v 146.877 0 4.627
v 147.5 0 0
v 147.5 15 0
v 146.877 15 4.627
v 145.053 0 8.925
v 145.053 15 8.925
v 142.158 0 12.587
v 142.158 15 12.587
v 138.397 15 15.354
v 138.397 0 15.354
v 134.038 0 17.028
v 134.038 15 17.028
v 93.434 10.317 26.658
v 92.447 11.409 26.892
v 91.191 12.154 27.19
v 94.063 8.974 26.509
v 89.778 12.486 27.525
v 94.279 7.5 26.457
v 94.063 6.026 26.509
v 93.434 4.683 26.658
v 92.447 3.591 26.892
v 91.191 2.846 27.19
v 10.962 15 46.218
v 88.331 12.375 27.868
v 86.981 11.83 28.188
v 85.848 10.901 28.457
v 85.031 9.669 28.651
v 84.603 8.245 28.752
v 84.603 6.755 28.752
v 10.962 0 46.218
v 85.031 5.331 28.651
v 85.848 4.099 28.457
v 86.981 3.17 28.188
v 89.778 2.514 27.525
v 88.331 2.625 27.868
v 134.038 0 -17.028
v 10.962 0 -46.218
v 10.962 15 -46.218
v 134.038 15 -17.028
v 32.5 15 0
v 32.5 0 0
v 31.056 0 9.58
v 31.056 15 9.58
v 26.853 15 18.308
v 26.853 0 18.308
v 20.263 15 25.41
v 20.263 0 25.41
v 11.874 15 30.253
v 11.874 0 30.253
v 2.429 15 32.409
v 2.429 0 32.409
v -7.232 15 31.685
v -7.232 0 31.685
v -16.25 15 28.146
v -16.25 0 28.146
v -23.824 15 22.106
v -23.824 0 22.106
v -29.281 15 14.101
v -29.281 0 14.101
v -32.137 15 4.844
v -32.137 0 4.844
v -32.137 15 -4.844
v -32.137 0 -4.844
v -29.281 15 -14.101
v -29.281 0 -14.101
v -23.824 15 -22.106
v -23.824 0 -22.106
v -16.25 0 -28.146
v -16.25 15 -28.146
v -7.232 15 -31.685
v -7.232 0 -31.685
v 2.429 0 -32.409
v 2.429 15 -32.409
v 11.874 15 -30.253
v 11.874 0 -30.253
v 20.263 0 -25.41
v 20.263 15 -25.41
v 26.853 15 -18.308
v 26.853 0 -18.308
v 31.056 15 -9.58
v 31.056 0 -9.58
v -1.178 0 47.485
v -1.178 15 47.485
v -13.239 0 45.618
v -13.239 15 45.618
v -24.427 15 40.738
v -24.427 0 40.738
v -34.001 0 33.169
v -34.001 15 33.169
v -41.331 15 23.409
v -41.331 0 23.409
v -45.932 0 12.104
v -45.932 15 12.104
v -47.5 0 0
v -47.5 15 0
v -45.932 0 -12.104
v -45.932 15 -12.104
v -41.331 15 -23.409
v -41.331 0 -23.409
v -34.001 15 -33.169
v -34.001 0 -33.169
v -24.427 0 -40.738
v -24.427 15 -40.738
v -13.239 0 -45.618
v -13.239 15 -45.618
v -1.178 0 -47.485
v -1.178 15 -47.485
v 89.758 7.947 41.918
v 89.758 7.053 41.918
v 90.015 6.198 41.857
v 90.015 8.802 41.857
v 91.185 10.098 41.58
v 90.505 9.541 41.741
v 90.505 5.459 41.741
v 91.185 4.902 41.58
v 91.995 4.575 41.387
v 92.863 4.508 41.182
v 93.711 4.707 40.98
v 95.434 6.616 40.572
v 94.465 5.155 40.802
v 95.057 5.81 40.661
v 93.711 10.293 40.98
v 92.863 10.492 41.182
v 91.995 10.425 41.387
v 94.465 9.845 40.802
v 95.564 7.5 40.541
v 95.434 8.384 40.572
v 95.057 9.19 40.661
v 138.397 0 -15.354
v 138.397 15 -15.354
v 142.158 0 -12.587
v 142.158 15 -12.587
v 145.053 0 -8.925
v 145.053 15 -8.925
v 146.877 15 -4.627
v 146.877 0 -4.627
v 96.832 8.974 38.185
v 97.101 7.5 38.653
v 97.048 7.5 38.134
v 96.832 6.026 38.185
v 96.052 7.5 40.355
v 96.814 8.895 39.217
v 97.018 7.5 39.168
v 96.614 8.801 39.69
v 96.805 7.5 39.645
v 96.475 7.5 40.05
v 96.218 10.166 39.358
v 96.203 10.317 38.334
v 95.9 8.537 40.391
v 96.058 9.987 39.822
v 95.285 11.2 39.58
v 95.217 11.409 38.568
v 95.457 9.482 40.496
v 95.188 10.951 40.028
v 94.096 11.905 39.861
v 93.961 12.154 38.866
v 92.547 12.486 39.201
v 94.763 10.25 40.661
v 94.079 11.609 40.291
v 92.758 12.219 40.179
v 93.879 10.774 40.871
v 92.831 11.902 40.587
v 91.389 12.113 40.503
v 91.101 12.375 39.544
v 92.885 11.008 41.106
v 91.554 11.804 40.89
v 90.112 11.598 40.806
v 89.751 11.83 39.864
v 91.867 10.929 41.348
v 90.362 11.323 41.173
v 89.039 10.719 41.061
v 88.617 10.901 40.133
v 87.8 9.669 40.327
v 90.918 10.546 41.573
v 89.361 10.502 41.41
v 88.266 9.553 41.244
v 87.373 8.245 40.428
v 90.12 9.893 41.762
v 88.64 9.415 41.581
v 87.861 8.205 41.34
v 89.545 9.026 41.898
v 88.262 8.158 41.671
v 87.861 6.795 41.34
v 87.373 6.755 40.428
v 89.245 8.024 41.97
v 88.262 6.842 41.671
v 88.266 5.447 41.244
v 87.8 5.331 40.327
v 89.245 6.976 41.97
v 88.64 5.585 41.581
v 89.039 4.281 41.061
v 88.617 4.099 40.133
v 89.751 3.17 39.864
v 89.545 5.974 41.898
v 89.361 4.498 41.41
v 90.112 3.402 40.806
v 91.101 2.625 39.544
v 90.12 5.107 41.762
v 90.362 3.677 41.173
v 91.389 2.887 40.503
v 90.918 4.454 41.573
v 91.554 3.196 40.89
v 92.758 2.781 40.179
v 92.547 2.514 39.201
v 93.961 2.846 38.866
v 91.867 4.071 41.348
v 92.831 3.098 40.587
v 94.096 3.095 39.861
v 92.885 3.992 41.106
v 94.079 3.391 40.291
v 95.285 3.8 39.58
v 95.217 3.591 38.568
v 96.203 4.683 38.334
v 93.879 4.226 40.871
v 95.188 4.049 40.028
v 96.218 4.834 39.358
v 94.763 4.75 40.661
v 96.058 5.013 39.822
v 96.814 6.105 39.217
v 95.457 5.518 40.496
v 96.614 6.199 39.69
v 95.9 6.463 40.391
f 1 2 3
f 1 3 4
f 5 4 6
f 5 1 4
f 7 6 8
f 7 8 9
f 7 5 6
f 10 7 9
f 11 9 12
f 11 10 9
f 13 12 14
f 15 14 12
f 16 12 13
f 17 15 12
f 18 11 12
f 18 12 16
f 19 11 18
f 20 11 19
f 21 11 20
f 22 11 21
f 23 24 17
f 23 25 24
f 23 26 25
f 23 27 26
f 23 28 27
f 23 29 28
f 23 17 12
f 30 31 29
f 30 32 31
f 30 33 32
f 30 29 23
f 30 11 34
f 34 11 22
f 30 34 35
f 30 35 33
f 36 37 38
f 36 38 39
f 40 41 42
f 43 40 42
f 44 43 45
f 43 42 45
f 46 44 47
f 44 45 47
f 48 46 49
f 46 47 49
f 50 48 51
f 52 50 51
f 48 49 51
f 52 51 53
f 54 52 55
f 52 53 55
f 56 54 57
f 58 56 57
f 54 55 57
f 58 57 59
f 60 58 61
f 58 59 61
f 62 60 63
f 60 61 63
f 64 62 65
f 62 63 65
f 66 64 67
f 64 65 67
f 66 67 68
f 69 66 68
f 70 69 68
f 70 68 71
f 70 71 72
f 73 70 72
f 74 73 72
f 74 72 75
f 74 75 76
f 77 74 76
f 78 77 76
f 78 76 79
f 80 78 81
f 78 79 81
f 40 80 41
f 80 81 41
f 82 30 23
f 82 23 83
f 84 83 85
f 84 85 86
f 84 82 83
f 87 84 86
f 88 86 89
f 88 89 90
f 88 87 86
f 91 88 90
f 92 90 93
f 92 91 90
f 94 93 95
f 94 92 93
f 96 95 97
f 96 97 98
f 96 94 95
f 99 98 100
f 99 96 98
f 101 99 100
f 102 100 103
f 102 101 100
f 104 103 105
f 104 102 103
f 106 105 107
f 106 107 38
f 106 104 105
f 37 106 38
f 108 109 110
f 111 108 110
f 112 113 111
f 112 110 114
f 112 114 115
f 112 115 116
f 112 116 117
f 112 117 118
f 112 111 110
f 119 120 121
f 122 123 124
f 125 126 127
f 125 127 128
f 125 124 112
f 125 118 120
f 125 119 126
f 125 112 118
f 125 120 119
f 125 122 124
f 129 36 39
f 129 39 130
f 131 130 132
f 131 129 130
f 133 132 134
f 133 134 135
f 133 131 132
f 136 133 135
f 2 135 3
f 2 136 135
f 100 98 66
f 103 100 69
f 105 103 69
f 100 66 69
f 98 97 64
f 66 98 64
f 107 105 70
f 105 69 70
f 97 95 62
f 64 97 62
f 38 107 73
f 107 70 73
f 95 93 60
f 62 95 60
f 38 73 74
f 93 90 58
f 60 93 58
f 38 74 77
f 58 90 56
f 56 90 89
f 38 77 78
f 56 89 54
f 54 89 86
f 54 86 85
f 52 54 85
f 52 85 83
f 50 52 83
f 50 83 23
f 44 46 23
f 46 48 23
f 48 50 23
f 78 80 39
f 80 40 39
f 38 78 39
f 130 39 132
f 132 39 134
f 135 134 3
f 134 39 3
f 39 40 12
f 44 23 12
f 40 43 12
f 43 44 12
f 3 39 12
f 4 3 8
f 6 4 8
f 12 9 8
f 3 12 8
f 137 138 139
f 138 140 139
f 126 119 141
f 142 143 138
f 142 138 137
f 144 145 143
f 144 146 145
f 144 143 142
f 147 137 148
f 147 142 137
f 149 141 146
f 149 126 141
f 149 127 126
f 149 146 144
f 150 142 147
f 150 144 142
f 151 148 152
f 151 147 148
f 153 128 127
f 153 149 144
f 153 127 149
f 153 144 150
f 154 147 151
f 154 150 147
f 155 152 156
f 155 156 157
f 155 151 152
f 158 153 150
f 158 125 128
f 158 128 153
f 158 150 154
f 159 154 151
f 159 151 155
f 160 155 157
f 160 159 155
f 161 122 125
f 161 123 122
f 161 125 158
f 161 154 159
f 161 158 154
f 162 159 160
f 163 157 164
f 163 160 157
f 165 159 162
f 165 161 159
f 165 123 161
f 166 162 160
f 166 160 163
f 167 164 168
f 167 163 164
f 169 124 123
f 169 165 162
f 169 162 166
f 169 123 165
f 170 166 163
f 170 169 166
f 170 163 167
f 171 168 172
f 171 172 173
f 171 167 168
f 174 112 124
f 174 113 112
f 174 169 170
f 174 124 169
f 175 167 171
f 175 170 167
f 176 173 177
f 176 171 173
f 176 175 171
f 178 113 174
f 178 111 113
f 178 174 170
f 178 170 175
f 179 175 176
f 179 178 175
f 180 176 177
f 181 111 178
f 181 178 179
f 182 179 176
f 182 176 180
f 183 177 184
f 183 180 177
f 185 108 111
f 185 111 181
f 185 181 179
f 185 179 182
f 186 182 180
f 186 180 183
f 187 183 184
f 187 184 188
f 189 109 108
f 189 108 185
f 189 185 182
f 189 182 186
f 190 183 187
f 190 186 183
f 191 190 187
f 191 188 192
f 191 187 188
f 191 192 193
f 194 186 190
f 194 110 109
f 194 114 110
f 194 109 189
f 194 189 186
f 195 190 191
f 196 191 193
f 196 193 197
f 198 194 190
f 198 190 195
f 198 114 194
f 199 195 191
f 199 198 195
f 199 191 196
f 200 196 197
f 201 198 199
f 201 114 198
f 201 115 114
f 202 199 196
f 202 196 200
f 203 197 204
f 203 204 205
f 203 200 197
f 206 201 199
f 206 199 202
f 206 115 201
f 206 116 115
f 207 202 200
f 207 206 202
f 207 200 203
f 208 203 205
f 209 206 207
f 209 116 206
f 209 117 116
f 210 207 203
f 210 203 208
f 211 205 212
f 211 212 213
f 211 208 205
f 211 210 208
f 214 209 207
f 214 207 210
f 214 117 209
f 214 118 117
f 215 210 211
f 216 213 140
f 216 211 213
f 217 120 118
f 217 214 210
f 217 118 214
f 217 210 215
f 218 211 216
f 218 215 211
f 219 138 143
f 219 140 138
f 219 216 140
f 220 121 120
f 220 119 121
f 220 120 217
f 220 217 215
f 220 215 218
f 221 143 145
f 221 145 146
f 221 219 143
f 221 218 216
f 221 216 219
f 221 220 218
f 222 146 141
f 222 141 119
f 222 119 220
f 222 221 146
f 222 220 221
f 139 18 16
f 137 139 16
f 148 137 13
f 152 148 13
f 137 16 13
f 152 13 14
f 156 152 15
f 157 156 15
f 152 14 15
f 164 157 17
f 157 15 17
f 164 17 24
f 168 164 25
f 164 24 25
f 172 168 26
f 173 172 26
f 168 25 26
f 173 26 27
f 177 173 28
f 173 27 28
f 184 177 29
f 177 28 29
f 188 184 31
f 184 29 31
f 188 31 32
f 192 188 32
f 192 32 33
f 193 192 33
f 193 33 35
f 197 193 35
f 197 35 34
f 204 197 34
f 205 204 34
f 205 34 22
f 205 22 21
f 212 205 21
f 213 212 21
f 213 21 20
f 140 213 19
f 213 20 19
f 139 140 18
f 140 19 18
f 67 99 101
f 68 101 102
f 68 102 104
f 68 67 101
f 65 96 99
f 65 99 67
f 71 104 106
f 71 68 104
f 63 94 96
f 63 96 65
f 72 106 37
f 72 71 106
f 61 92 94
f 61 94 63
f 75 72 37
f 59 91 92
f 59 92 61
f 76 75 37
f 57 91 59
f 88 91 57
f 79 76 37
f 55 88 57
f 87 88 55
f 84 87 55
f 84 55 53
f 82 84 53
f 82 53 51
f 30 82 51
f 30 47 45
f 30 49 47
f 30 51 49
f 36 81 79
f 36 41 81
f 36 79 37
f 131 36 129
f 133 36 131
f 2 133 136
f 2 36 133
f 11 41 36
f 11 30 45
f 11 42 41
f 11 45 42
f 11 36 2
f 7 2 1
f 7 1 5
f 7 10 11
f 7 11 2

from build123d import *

# Parameters (mm, degrees)
F0_R     = 32.5
F1_DEPTH = 15
F2_R     = 5
F3_DEPTH = 14
F4_R     = 2


with BuildPart() as f1:
    # F0 (on Front) → F1 (new body)
    with BuildSketch(Plane.XZ):
        with BuildLine():
            ThreePointArc((10.9615384615, -46.217904264), (37.2620656763, -29.4582494649), (47.5, 0))
            ThreePointArc((47.5, 0), (37.2620656763, 29.4582494649), (10.9615384615, 46.217904264))
            ThreePointArc((10.9615384615, 46.217904264), (-47.5, 0), (10.9615384615, -46.217904264))
        make_face()
        Circle(F0_R, mode=Mode.SUBTRACT)
        with BuildLine():
            ThreePointArc((10.9615384615, 46.217904264), (37.2620656763, 29.4582494649), (47.5, 0))
            ThreePointArc((47.5, 0), (37.2620656763, -29.4582494649), (10.9615384615, -46.217904264))
            Line((10.9615384615, -46.217904264), (134.0384615385, -17.0276489394))
            ThreePointArc((134.0384615385, -17.0276489394), (112.5, 0), (134.0384615385, 17.0276489394))
            Line((134.0384615385, 17.0276489394), (10.9615384615, 46.217904264))
        make_face()
        with BuildLine():
            ThreePointArc((147.5, 0), (143.7281294597, 10.8530392766), (134.0384615385, 17.0276489394))
            ThreePointArc((134.0384615385, 17.0276489394), (112.5, 0), (134.0384615385, -17.0276489394))
            ThreePointArc((134.0384615385, -17.0276489394), (143.7281294597, -10.8530392766), (147.5, 0))
        make_face()
    extrude(amount=-F1_DEPTH)

    # F2 (on face) → F3 (join)
    with BuildSketch(Plane(origin=(10.9615384615, 0, 46.217904264), x_dir=(0.9730085108, 0, -0.2307692308), z_dir=(0.2307692308, 0, 0.9730085108))):
        with Locations((80.6287527084, 7.5)):
            Circle(F2_R)
    extrude(amount=F3_DEPTH)

    # F4
    f4_edges = [f1.edges().sort_by_distance(p)[0] for p in [
        (87.779728, 7.5, 42.387234),
    ]]
    fillet(f4_edges, radius=F4_R)


solid = f1.part
